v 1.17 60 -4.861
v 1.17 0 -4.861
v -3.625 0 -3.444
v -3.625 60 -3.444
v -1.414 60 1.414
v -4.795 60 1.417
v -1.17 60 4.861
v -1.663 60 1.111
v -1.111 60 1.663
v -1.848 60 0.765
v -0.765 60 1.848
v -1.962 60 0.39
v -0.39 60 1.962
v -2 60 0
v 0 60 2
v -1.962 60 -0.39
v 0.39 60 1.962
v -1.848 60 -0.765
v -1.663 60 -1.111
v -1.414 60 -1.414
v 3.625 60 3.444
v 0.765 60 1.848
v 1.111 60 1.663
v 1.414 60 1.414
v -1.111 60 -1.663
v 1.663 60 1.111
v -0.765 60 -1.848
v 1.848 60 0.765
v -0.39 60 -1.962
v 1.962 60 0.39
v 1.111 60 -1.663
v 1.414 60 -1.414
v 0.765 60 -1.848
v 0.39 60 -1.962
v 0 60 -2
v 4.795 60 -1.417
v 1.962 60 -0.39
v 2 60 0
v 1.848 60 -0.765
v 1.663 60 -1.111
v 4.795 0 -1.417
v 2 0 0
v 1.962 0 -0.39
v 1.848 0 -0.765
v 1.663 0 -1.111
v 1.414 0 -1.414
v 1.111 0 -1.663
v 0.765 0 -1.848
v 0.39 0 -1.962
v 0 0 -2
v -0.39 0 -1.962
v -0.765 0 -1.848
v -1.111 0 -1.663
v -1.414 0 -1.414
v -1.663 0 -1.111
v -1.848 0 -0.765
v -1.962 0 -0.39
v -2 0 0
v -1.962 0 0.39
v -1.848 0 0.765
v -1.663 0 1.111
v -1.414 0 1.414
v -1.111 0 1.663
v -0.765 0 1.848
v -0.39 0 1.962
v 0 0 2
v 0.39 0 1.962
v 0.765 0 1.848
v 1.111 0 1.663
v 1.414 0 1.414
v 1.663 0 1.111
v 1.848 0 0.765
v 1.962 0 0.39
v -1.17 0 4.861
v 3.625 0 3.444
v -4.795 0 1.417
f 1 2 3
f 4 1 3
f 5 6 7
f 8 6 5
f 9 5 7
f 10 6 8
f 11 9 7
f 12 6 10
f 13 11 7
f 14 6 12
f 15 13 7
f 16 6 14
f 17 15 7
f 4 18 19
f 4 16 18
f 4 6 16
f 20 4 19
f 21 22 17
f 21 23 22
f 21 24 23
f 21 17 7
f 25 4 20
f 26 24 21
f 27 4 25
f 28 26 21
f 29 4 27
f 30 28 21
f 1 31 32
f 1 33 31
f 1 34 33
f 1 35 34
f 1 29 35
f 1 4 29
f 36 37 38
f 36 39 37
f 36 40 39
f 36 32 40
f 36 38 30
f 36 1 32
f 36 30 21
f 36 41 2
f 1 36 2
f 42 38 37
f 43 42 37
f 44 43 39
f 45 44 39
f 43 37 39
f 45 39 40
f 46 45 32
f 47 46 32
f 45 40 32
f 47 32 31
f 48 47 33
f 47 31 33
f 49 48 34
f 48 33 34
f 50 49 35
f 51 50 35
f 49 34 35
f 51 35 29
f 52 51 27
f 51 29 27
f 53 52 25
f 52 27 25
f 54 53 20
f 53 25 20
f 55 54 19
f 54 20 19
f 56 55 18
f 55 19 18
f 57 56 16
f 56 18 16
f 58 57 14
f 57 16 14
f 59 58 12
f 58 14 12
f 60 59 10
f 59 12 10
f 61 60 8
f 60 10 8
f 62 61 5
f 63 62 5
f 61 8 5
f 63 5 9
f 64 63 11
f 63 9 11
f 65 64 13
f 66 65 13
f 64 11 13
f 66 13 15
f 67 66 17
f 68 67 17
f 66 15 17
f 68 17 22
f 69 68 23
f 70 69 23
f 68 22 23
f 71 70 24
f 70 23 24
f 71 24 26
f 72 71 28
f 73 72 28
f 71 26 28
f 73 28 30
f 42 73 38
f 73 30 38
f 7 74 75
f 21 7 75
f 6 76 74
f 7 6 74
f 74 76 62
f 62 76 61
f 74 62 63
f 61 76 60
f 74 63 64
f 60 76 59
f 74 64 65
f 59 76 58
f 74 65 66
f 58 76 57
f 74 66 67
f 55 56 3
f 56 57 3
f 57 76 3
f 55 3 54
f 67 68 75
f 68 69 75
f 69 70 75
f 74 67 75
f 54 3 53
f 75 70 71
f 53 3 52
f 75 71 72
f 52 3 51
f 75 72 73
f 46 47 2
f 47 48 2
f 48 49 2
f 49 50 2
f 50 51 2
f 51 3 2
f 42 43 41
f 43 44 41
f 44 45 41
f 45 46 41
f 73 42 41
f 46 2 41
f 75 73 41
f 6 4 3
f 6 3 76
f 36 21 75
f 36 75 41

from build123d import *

# Parameters (mm, degrees)
EXTRUDE_THIN1_DEPTH = 60
SKETCH2_R           = 4
SKETCH2_R_2         = 2
EXTRUDE_THIN2_DEPTH = 60


with BuildPart() as part:
    # Sketch1 → Extrude-Thin1 (new body)
    with BuildSketch(Plane(origin=(0, 0, 0), x_dir=(1, 0, 0), z_dir=(0, 1, 0))):
        Polygon((3.624997168, -3.44374731), (4.794871238, 1.417465981), (1.16987407, 4.861213291), (-3.624997168, 3.44374731), (-4.794871238, -1.417465981), (-1.16987407, -4.861213291), align=None)
        Polygon((1.950682695, -1.853148561), (2.580215078, 0.762766489), (0.629532383, 2.615915049), (-1.950682695, 1.853148561), (-2.580215078, -0.762766489), (-0.629532383, -2.615915049), align=None, mode=Mode.SUBTRACT)
    extrude(amount=EXTRUDE_THIN1_DEPTH)

    # Sketch2 → Extrude-Thin2 (add)
    with BuildSketch(Plane(origin=(0, 60, 0), x_dir=(1, 0, 0), z_dir=(0, 1, 0))):
        Circle(SKETCH2_R)
        Circle(SKETCH2_R_2, mode=Mode.SUBTRACT)
    extrude(amount=-EXTRUDE_THIN2_DEPTH)


solid = part.part
